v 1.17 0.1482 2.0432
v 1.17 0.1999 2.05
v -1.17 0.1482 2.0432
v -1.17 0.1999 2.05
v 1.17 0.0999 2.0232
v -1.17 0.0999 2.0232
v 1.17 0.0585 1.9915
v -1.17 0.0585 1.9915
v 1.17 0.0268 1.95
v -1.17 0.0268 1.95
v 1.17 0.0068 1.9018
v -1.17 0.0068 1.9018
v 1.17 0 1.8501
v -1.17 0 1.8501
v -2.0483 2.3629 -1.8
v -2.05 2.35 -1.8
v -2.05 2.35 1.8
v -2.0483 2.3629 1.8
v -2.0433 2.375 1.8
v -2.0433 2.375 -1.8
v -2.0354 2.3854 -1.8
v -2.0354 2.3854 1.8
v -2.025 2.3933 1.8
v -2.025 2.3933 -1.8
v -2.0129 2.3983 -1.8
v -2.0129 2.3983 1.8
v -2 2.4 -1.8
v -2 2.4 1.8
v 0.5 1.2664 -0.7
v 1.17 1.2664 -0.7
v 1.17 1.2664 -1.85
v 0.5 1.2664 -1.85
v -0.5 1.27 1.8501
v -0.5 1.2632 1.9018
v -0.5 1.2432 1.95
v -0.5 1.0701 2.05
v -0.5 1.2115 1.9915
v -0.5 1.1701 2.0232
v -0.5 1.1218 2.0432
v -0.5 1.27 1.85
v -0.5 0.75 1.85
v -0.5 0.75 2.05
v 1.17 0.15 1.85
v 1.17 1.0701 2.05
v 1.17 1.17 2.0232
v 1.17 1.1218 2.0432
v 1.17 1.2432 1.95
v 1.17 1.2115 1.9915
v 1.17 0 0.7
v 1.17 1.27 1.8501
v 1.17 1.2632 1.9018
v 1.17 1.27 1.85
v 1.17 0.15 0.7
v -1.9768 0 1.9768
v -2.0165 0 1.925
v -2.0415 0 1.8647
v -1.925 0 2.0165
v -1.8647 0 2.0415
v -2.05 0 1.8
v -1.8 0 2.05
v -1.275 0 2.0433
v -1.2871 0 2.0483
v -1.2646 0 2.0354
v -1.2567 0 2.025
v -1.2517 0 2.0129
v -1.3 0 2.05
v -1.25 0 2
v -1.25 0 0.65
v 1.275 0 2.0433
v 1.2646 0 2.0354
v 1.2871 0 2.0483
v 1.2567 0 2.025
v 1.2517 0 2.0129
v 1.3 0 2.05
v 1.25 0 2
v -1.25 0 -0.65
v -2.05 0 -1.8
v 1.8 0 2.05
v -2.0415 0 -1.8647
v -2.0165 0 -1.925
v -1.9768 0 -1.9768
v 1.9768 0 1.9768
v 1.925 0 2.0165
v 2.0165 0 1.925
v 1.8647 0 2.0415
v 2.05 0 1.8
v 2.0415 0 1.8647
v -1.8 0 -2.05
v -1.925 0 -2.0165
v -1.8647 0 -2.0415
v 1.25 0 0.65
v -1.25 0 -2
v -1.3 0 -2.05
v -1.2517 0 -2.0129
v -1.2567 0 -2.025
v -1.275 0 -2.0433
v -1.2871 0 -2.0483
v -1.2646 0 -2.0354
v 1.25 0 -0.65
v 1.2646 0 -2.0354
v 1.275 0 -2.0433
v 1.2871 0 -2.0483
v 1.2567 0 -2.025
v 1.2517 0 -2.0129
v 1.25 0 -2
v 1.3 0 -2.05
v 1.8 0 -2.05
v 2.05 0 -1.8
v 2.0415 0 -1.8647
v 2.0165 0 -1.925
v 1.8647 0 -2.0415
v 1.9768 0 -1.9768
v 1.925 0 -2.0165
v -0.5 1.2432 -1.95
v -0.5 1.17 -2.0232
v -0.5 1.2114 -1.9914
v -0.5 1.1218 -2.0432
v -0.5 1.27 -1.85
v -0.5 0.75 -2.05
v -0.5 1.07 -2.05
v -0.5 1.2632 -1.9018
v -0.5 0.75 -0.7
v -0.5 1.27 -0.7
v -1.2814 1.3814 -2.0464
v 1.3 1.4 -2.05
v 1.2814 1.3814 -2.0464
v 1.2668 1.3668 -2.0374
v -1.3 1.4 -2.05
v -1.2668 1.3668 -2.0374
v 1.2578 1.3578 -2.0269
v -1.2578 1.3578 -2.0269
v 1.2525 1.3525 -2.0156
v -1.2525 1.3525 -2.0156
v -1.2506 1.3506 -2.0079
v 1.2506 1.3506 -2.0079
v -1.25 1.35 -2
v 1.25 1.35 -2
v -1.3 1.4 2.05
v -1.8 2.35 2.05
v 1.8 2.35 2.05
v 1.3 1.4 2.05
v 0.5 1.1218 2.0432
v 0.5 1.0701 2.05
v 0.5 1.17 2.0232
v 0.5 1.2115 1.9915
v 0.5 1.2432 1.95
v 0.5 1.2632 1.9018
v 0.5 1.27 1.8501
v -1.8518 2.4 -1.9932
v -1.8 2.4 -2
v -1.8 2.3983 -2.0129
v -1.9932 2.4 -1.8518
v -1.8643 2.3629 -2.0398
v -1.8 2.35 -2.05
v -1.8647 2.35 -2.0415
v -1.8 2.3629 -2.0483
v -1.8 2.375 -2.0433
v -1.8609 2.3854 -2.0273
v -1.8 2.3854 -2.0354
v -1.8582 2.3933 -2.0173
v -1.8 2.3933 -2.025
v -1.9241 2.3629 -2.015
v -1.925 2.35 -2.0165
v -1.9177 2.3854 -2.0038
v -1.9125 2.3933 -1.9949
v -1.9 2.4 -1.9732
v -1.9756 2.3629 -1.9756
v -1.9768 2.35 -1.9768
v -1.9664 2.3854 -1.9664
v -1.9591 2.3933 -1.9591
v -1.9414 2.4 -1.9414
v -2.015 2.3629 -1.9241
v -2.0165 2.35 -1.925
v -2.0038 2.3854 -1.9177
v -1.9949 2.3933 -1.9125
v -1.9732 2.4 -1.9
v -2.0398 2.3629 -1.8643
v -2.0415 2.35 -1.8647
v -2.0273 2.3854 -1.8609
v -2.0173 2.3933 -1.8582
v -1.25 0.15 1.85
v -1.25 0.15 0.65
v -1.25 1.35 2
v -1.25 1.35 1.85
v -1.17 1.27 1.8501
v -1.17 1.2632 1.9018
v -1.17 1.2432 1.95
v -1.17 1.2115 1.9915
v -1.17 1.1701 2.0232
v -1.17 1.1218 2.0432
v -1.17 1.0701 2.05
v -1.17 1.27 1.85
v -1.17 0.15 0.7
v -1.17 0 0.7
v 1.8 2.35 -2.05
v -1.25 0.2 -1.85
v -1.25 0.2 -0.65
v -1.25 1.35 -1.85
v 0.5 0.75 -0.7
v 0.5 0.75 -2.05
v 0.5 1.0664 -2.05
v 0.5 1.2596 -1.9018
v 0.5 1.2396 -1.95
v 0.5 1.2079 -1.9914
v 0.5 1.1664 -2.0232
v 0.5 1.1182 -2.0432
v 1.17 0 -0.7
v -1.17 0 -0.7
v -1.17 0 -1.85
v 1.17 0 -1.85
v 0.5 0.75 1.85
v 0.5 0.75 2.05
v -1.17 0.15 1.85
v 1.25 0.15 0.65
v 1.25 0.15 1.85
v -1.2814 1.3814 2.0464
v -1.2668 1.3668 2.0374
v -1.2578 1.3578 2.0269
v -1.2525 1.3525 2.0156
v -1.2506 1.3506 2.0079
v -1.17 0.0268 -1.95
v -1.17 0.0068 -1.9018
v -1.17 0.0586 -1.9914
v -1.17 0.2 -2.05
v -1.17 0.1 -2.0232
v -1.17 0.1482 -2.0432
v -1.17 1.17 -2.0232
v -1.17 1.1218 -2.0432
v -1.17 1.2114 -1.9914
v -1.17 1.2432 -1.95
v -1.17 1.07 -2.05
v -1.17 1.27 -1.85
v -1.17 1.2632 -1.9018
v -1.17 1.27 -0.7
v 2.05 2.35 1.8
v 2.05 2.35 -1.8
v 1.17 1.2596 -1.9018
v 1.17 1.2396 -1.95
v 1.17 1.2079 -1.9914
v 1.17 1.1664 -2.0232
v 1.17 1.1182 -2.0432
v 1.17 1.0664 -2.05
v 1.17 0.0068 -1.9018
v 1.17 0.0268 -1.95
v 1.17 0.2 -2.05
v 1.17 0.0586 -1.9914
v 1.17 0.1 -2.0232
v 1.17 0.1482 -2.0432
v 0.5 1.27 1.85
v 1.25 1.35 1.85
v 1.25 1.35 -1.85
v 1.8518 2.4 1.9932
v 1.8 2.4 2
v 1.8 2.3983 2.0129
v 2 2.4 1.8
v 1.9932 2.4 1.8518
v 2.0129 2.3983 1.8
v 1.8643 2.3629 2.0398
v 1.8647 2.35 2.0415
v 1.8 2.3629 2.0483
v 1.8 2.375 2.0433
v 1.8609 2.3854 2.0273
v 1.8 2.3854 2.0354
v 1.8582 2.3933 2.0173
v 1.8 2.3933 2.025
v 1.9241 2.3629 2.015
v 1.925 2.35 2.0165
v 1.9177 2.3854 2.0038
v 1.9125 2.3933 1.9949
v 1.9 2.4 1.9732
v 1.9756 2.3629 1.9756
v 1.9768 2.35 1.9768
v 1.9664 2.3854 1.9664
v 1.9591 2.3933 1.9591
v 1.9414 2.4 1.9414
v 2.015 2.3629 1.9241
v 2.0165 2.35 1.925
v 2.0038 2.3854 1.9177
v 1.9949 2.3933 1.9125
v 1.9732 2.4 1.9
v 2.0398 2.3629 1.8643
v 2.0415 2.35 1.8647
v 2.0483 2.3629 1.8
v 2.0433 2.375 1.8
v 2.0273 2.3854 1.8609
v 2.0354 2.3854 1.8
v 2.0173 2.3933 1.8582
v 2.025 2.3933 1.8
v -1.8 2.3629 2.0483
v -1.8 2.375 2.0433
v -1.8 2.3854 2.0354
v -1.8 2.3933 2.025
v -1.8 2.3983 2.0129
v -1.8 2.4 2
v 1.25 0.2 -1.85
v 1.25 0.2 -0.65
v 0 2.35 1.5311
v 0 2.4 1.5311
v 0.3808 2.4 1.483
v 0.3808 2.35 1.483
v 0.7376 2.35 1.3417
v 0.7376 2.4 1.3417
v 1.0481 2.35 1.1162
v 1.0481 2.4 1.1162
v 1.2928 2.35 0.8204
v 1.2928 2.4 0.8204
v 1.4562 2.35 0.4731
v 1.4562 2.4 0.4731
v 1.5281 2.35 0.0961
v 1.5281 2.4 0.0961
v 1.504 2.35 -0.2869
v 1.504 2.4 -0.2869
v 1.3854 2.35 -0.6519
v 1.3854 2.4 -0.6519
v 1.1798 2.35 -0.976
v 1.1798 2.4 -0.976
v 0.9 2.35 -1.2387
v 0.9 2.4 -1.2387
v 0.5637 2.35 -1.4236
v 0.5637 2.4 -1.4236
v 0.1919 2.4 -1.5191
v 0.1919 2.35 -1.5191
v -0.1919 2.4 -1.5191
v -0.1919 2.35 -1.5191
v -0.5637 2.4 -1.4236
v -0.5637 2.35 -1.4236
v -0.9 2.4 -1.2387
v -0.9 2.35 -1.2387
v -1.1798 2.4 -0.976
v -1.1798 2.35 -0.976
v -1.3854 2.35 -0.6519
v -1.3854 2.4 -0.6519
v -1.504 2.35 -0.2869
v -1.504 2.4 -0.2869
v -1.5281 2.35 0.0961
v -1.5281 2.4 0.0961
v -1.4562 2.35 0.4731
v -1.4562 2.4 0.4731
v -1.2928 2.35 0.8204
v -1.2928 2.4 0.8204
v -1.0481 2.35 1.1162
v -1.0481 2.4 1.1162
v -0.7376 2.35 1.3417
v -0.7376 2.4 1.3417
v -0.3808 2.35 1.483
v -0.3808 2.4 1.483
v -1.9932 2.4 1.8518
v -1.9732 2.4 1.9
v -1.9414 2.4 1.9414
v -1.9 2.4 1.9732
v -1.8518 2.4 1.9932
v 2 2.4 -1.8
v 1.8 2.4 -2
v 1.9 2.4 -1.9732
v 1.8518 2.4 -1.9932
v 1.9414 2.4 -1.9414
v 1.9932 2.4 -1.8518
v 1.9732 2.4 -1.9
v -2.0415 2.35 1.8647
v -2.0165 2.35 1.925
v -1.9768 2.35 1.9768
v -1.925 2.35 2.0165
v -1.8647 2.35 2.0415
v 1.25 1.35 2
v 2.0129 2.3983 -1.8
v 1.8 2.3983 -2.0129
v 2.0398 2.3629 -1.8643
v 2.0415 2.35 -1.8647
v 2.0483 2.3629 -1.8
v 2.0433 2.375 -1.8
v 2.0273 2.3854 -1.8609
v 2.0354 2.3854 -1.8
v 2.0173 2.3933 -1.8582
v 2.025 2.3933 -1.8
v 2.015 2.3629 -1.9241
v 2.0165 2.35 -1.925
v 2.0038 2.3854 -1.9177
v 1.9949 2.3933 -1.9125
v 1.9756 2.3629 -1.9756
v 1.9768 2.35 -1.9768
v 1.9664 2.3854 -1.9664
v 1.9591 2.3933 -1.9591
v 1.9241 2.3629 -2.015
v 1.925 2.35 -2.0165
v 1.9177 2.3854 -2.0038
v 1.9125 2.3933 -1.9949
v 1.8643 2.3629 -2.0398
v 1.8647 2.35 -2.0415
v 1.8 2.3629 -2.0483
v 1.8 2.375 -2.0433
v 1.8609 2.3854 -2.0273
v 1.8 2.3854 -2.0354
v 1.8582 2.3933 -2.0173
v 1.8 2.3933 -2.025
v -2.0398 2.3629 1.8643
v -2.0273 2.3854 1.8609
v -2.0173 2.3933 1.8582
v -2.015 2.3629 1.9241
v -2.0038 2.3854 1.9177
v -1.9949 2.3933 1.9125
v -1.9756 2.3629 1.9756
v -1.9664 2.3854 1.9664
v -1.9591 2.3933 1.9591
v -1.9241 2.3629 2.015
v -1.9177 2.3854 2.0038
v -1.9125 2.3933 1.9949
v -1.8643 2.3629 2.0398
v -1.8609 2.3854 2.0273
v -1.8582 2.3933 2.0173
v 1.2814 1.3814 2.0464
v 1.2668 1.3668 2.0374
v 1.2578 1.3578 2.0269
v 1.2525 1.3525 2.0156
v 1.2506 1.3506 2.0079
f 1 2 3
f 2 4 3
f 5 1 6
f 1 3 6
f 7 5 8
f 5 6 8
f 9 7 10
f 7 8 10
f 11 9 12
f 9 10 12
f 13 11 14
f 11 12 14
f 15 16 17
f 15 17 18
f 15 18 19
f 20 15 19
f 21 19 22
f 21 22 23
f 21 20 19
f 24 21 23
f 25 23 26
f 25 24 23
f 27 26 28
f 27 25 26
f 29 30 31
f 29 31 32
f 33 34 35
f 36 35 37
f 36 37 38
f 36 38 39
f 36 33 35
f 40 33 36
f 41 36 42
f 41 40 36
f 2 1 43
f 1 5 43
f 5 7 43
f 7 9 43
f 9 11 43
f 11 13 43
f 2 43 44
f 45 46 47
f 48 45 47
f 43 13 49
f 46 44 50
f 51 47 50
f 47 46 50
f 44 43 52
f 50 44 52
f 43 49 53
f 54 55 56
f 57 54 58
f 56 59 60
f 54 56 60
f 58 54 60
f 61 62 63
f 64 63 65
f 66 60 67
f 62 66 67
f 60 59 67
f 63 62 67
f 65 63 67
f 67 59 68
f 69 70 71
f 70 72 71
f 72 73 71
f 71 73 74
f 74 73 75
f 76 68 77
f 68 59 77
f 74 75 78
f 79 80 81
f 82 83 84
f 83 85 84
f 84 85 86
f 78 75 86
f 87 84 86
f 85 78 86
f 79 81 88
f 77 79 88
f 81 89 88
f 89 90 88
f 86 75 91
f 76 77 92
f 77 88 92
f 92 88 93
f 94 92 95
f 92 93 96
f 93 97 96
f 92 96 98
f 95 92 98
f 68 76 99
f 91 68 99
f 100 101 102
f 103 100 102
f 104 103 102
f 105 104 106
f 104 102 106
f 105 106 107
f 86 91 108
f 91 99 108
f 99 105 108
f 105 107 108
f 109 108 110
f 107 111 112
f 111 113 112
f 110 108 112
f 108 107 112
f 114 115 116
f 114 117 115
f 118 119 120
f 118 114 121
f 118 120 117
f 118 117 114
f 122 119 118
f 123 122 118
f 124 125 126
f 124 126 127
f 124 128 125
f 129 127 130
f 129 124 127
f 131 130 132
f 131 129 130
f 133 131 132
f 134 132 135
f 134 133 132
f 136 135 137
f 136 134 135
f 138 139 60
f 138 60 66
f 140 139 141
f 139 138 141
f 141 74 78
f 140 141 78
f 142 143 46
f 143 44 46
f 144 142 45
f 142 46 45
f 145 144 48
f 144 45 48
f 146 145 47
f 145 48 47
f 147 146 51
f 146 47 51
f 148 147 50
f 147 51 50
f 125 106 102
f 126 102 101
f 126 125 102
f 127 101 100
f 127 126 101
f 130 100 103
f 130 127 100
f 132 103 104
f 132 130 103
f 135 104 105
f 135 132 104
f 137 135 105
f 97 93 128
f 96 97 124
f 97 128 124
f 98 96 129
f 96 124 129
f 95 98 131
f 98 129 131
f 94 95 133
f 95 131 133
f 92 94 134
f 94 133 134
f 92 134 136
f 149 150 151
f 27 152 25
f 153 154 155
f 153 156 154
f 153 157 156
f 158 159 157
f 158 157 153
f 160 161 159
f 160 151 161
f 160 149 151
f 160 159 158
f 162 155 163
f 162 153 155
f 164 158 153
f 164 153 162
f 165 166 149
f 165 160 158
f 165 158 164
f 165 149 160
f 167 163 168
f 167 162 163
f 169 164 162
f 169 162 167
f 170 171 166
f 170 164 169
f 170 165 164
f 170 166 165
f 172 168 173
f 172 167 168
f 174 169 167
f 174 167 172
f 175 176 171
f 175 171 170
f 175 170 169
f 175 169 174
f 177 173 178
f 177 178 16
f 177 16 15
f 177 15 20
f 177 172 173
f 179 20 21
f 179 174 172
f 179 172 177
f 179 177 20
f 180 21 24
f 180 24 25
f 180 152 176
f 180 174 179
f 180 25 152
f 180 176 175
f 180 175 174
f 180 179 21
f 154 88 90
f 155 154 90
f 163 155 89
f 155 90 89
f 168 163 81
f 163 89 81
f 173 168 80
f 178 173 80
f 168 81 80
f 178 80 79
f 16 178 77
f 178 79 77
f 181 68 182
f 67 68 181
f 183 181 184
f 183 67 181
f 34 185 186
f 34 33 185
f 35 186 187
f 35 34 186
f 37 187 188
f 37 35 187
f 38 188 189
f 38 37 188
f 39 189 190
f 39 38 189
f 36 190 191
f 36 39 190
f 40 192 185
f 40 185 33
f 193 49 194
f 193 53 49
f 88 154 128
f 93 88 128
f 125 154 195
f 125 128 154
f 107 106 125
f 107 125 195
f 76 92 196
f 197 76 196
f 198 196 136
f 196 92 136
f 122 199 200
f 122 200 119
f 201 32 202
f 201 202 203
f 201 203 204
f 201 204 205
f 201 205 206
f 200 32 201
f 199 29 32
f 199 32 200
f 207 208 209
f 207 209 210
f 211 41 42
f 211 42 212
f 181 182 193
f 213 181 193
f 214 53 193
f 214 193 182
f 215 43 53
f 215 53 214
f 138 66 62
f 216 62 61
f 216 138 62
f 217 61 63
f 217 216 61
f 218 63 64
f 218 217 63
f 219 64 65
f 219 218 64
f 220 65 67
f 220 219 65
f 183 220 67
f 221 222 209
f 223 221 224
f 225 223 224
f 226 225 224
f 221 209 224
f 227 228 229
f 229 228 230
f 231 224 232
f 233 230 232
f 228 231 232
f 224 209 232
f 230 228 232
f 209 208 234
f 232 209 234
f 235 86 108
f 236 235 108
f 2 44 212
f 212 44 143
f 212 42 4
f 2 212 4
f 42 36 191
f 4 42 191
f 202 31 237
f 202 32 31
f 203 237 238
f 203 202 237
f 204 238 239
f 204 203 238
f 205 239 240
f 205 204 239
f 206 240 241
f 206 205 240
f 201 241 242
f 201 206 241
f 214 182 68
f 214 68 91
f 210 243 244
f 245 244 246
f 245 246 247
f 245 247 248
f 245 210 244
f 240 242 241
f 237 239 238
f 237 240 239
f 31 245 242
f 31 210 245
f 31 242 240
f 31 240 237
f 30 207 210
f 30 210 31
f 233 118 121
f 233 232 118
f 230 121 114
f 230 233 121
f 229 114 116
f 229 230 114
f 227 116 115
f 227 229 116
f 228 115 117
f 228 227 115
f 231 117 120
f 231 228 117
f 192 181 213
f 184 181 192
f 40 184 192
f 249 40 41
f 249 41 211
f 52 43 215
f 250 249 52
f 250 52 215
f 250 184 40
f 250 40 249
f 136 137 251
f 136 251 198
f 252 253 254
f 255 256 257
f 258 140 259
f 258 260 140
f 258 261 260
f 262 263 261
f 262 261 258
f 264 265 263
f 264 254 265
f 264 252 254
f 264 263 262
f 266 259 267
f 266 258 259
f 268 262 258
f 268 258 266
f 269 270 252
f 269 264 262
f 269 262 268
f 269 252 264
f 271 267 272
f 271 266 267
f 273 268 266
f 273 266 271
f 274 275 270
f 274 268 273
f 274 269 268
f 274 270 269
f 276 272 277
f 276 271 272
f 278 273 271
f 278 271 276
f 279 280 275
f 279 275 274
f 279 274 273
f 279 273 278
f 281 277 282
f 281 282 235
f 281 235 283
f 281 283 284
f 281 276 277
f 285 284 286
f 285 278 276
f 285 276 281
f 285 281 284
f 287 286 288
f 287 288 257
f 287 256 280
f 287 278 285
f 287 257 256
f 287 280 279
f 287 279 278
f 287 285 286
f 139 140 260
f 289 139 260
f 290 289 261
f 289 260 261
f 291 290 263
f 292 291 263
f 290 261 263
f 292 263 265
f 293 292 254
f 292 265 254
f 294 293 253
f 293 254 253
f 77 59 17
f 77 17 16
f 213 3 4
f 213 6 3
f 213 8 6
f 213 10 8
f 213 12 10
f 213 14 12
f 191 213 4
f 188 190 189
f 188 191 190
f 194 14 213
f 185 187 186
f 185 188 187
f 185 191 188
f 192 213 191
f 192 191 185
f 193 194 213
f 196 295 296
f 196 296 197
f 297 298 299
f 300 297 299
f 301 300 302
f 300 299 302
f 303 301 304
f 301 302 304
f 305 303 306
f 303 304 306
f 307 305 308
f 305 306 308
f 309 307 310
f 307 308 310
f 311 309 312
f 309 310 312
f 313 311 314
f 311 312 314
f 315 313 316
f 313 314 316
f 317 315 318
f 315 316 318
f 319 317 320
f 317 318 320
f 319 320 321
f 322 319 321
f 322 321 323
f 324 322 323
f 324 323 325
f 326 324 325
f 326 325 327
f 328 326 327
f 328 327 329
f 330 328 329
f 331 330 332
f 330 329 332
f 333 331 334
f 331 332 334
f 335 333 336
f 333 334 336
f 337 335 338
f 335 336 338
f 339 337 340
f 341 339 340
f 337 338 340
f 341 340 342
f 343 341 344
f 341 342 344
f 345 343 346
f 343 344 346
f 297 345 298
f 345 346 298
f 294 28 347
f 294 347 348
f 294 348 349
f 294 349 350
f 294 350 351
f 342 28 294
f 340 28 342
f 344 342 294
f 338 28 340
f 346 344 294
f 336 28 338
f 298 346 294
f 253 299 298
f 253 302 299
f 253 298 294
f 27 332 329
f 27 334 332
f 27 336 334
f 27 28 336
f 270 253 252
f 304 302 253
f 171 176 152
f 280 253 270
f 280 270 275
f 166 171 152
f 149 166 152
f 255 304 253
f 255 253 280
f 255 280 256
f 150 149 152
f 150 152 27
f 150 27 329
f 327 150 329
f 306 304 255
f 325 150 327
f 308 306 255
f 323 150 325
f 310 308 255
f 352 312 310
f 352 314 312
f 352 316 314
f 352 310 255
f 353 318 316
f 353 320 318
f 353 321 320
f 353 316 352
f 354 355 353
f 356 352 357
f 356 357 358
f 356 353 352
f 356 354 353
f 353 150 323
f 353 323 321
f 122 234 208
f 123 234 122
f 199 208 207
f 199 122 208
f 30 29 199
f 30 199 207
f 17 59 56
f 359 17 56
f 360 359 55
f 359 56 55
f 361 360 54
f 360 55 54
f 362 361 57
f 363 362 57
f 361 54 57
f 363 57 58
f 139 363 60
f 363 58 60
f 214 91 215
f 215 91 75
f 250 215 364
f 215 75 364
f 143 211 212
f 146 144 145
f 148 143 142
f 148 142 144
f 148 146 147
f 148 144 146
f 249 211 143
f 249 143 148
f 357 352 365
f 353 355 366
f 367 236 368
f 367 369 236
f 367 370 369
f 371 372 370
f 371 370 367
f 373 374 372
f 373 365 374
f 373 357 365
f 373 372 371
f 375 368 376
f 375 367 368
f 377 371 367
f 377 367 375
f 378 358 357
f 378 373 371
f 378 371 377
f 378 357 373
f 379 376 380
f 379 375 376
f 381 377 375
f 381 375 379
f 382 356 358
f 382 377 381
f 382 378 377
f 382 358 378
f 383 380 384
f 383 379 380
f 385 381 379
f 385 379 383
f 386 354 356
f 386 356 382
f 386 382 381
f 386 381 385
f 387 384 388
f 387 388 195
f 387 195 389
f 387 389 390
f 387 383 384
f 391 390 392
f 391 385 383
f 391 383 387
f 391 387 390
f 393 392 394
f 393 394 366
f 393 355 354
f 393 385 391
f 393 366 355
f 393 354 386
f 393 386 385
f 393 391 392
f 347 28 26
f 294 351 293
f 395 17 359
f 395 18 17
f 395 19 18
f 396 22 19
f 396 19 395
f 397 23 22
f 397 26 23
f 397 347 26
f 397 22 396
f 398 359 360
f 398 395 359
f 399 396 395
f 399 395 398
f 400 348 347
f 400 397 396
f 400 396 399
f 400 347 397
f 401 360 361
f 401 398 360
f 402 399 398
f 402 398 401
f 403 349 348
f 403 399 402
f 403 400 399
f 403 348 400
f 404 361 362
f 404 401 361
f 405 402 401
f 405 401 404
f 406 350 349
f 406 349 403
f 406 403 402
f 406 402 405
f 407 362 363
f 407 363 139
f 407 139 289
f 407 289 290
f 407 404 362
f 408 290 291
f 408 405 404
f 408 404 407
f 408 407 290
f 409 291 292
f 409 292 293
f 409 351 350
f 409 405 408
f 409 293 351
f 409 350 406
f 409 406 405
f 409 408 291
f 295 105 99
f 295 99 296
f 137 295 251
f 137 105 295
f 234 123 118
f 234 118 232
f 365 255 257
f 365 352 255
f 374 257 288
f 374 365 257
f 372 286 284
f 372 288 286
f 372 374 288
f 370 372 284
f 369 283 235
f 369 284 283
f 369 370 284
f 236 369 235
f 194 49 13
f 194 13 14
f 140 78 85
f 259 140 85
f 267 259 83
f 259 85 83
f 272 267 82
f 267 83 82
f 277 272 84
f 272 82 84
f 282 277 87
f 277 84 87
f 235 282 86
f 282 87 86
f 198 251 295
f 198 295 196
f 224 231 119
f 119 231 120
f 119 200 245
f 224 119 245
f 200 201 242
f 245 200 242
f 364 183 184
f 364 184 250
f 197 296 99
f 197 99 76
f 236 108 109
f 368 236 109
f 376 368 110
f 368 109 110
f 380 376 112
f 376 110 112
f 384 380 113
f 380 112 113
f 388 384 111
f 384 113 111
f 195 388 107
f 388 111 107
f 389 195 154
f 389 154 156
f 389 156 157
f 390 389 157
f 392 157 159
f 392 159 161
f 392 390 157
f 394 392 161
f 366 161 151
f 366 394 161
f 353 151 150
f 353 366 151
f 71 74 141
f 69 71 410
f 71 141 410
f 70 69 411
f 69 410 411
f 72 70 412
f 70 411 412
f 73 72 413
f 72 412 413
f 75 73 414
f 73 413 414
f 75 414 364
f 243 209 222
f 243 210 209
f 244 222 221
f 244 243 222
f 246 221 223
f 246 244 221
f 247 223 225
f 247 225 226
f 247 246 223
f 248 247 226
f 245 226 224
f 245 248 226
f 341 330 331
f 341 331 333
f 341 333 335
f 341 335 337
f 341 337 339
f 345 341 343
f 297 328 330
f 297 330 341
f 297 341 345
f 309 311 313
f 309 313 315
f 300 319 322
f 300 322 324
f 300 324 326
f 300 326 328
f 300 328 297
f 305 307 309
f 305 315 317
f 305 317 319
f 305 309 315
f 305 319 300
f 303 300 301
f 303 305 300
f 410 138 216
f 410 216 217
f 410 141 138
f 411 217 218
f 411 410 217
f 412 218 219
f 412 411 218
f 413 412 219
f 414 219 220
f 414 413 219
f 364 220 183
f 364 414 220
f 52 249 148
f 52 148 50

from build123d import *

# Parameters (mm, degrees)
SKETCH_1_W           = 4.1
SKETCH_1_H           = 4.1
EXTRUDE_1_DEPTH      = 2.4
SKETCH_2_W           = 2.5
SKETCH_2_H           = 2.7
CUT_EXTRUDE_1_DEPTH  = 0.2
SKETCH_3_W           = 2.5
SKETCH_3_H           = 0.3
CUT_EXTRUDE_2_DEPTH  = 1.2
SKETCH_4_W           = 2.5
SKETCH_4_H           = 2.7
CUT_EXTRUDE_3_DEPTH  = 0.2
SKETCH_5_W           = 2.5
SKETCH_5_H           = 0.4
CUT_EXTRUDE_4_DEPTH  = 1.2
SKETCH_6_R           = 1.531140145
CUT_EXTRUDE_6_DEPTH  = 0.05
FILLET_3_R           = 0.05
FILLET_4_R           = 0.25
EXTRUDE_2_DEPTH      = 0.2
EXTRUDE_2_DEPTH_BACK = 1.15
EXTRUDE_3_DEPTH      = 0.2
EXTRUDE_3_DEPTH_BACK = 1.15
FILLET_7_R           = 0.2
FILLET_8_R           = 0.2


# Some blends are built 0.0001 mm under size
with BuildPart() as part:
    # Эскиз1 → Бобышка-Вытянуть1 (new body)
    with BuildSketch(Plane(origin=(0, 0, 0), x_dir=(1, 0, 0), z_dir=(0, 1, 0))):
        Rectangle(SKETCH_1_W, SKETCH_1_H)
    extrude(amount=EXTRUDE_1_DEPTH)

    # Эскиз2 → Вырез-Вытянуть1 (cut)
    with BuildSketch(Plane.XY.offset(2.05)):
        Rectangle(SKETCH_2_W, SKETCH_2_H)
    extrude(amount=-CUT_EXTRUDE_1_DEPTH, mode=Mode.SUBTRACT)

    # Эскиз3 → Вырез-Вытянуть2 (cut)
    with BuildSketch(Plane.XY.offset(1.85)):
        Rectangle(SKETCH_3_W, SKETCH_3_H)
    extrude(amount=-CUT_EXTRUDE_2_DEPTH, mode=Mode.SUBTRACT)

    # Эскиз4 → Вырез-Вытянуть3 (cut)
    with BuildSketch(Plane(origin=(0, 0, -2.05), x_dir=(-1, 0, 0), z_dir=(0, 0, -1))):
        Rectangle(SKETCH_4_W, SKETCH_4_H)
    extrude(amount=-CUT_EXTRUDE_3_DEPTH, mode=Mode.SUBTRACT)

    # Эскиз5 → Вырез-Вытянуть4 (cut)
    with BuildSketch(Plane(origin=(0, 0, -1.85), x_dir=(-1, 0, 0), z_dir=(0, 0, -1))):
        Rectangle(SKETCH_5_W, SKETCH_5_H)
    extrude(amount=-CUT_EXTRUDE_4_DEPTH, mode=Mode.SUBTRACT)

    # Эскиз6 → Вырез-Вытянуть6 (cut)
    with BuildSketch(Plane(origin=(0, 2.4, 0), x_dir=(1, 0, 0), z_dir=(0, 1, 0))):
        with Locations(Location((0, 0, 0), (0, 0, 270))):
            Circle(SKETCH_6_R)
    extrude(amount=-CUT_EXTRUDE_6_DEPTH, mode=Mode.SUBTRACT)

    # Скругление3
    fillet_3_edges = [part.edges().sort_by_distance(p)[0] for p in [
        (-2.05, 2.4, 0),
        (0, 2.4, 2.05),
        (-1.25, 0.675, 2.05),
        (1.25, 0.675, 2.05),
        (0, 1.35, 2.05),
        (2.05, 2.4, 0),
        (1.25, 0.675, -2.05),
        (-1.25, 0.675, -2.05),
        (0, 1.35, -2.05),
        (0, 2.4, -2.05),
    ]]
    fillet(fillet_3_edges, radius=FILLET_3_R)

    # Скругление4
    # the kernel refuses this fillet: 0.25 mm, written as the material it takes off along each edge
    with BuildSketch(Plane(origin=(1.8, 2.4, 1.8), x_dir=(0, 0, 1), z_dir=(-1, 0, 0))) as fillet_4_piece_1:
        with BuildLine():
            CenterArc((0.2, -0.05), 0.05, 0, 90)
            Line((0.25, -0.05), (0.25, 0))
            Line((0.25, 0), (0.2, 0))
        make_face()
    revolve(axis=Axis((1.8, 2.4, 1.8), (0, 1, 0)), revolution_arc=90, mode=Mode.SUBTRACT)
    with BuildSketch(Plane(origin=(-1.8, 2.4, 1.8), x_dir=(-1, 0, 0), z_dir=(0, 0, -1))) as fillet_4_piece_2:
        with BuildLine():
            CenterArc((0.2, -0.05), 0.05, 0, 90)
            Line((0.25, -0.05), (0.25, 0))
            Line((0.25, 0), (0.2, 0))
        make_face()
    revolve(axis=Axis((-1.8, 2.4, 1.8), (0, 1, 0)), revolution_arc=90, mode=Mode.SUBTRACT)
    with BuildSketch(Plane(origin=(1.8, 2.4, -1.8), x_dir=(1, 0, 0), z_dir=(0, 0, 1))) as fillet_4_piece_3:
        with BuildLine():
            CenterArc((0.2, -0.05), 0.05, 0, 90)
            Line((0.25, -0.05), (0.25, 0))
            Line((0.25, 0), (0.2, 0))
        make_face()
    revolve(axis=Axis((1.8, 2.4, -1.8), (0, 1, 0)), revolution_arc=90, mode=Mode.SUBTRACT)
    with BuildSketch(Plane(origin=(-1.8, 2.4, -1.8), x_dir=(0, 0, -1), z_dir=(1, 0, 0))) as fillet_4_piece_4:
        with BuildLine():
            CenterArc((0.2, -0.05), 0.05, 0, 90)
            Line((0.25, -0.05), (0.25, 0))
            Line((0.25, 0), (0.2, 0))
        make_face()
    revolve(axis=Axis((-1.8, 2.4, -1.8), (0, 1, 0)), revolution_arc=90, mode=Mode.SUBTRACT)
    with BuildSketch(Plane(origin=(2.05, -0.625, 2.05), x_dir=(-1, 0, 0), z_dir=(0, 1, 0)), Plane(origin=(2.05, -0.625, -2.05), x_dir=(0, 0, 1), z_dir=(0, 1, 0))) as fillet_4_piece_5:
        with BuildLine():
            CenterArc((FILLET_4_R, -FILLET_4_R), FILLET_4_R, 90, 90)
            Line((0, -FILLET_4_R), (0, 0))
            Line((0, 0), (FILLET_4_R, 0))
        make_face()
    extrude(amount=3.025, mode=Mode.SUBTRACT)
    with BuildSketch(Plane(origin=(-2.05, -0.625, 2.05), x_dir=(1, 0, 0), z_dir=(0, 1, 0)), Plane(origin=(-2.05, -0.625, -2.05), x_dir=(0, 0, 1), z_dir=(0, 1, 0))) as fillet_4_piece_6:
        with BuildLine():
            CenterArc((FILLET_4_R, FILLET_4_R), FILLET_4_R, 180, 90)
            Line((0, FILLET_4_R), (0, 0))
            Line((0, 0), (FILLET_4_R, 0))
        make_face()
    extrude(amount=3.025, mode=Mode.SUBTRACT)

    # Эскиз10 → Бобышка-Вытянуть3 (add, two sides: drawn at the far end of the back side and taken through both)
    with BuildSketch(Plane.XY.offset(1.85).offset(-EXTRUDE_3_DEPTH_BACK)):
        Polygon((-1.17, 0), (-1.17, 1.27), (-0.5, 1.27), (-0.5, 0.75), (0.5, 0.75), (0.5, 1.27), (1.17, 1.27), (1.17, 0.2), (1.17, 0), align=None)
    extrude(amount=EXTRUDE_3_DEPTH + EXTRUDE_3_DEPTH_BACK)

    # Скругление7
    fillet_7_edges = [part.edges().sort_by_distance(p)[0] for p in [
        (0, 0, 2.05),
        (-0.835, 1.27, 2.05),
        (0.835, 1.27, 2.05),
    ]]
    fillet(fillet_7_edges, radius=FILLET_7_R - 0.0001)  # a hair under: the kernel refuses the full size


with BuildPart() as body_2:
    # Эскиз8 → Бобышка-Вытянуть2 (new, two sides: drawn at the far end of the back side and taken through both)
    with BuildSketch(Plane(origin=(0, 0, -1.85), x_dir=(-1, 0, 0), z_dir=(0, 0, -1)).offset(-EXTRUDE_2_DEPTH_BACK)):
        Polygon((-1.17, 0), (-1.17, 1.266443577), (-0.5, 1.266443577), (-0.5, 0.75), (0.5, 0.75), (0.5, 1.27), (1.17, 1.27), (1.17, 0.2), (1.17, 0), align=None)
    extrude(amount=EXTRUDE_2_DEPTH + EXTRUDE_2_DEPTH_BACK)

    # Скругление8
    fillet_8_edges = [body_2.edges().sort_by_distance(p)[0] for p in [
        (0, 0, -2.05),
        (-0.835, 1.27, -2.05),
        (0.835, 1.266443577, -2.05),
    ]]
    fillet(fillet_8_edges, radius=FILLET_8_R)


solid = Compound([part.part, body_2.part])
